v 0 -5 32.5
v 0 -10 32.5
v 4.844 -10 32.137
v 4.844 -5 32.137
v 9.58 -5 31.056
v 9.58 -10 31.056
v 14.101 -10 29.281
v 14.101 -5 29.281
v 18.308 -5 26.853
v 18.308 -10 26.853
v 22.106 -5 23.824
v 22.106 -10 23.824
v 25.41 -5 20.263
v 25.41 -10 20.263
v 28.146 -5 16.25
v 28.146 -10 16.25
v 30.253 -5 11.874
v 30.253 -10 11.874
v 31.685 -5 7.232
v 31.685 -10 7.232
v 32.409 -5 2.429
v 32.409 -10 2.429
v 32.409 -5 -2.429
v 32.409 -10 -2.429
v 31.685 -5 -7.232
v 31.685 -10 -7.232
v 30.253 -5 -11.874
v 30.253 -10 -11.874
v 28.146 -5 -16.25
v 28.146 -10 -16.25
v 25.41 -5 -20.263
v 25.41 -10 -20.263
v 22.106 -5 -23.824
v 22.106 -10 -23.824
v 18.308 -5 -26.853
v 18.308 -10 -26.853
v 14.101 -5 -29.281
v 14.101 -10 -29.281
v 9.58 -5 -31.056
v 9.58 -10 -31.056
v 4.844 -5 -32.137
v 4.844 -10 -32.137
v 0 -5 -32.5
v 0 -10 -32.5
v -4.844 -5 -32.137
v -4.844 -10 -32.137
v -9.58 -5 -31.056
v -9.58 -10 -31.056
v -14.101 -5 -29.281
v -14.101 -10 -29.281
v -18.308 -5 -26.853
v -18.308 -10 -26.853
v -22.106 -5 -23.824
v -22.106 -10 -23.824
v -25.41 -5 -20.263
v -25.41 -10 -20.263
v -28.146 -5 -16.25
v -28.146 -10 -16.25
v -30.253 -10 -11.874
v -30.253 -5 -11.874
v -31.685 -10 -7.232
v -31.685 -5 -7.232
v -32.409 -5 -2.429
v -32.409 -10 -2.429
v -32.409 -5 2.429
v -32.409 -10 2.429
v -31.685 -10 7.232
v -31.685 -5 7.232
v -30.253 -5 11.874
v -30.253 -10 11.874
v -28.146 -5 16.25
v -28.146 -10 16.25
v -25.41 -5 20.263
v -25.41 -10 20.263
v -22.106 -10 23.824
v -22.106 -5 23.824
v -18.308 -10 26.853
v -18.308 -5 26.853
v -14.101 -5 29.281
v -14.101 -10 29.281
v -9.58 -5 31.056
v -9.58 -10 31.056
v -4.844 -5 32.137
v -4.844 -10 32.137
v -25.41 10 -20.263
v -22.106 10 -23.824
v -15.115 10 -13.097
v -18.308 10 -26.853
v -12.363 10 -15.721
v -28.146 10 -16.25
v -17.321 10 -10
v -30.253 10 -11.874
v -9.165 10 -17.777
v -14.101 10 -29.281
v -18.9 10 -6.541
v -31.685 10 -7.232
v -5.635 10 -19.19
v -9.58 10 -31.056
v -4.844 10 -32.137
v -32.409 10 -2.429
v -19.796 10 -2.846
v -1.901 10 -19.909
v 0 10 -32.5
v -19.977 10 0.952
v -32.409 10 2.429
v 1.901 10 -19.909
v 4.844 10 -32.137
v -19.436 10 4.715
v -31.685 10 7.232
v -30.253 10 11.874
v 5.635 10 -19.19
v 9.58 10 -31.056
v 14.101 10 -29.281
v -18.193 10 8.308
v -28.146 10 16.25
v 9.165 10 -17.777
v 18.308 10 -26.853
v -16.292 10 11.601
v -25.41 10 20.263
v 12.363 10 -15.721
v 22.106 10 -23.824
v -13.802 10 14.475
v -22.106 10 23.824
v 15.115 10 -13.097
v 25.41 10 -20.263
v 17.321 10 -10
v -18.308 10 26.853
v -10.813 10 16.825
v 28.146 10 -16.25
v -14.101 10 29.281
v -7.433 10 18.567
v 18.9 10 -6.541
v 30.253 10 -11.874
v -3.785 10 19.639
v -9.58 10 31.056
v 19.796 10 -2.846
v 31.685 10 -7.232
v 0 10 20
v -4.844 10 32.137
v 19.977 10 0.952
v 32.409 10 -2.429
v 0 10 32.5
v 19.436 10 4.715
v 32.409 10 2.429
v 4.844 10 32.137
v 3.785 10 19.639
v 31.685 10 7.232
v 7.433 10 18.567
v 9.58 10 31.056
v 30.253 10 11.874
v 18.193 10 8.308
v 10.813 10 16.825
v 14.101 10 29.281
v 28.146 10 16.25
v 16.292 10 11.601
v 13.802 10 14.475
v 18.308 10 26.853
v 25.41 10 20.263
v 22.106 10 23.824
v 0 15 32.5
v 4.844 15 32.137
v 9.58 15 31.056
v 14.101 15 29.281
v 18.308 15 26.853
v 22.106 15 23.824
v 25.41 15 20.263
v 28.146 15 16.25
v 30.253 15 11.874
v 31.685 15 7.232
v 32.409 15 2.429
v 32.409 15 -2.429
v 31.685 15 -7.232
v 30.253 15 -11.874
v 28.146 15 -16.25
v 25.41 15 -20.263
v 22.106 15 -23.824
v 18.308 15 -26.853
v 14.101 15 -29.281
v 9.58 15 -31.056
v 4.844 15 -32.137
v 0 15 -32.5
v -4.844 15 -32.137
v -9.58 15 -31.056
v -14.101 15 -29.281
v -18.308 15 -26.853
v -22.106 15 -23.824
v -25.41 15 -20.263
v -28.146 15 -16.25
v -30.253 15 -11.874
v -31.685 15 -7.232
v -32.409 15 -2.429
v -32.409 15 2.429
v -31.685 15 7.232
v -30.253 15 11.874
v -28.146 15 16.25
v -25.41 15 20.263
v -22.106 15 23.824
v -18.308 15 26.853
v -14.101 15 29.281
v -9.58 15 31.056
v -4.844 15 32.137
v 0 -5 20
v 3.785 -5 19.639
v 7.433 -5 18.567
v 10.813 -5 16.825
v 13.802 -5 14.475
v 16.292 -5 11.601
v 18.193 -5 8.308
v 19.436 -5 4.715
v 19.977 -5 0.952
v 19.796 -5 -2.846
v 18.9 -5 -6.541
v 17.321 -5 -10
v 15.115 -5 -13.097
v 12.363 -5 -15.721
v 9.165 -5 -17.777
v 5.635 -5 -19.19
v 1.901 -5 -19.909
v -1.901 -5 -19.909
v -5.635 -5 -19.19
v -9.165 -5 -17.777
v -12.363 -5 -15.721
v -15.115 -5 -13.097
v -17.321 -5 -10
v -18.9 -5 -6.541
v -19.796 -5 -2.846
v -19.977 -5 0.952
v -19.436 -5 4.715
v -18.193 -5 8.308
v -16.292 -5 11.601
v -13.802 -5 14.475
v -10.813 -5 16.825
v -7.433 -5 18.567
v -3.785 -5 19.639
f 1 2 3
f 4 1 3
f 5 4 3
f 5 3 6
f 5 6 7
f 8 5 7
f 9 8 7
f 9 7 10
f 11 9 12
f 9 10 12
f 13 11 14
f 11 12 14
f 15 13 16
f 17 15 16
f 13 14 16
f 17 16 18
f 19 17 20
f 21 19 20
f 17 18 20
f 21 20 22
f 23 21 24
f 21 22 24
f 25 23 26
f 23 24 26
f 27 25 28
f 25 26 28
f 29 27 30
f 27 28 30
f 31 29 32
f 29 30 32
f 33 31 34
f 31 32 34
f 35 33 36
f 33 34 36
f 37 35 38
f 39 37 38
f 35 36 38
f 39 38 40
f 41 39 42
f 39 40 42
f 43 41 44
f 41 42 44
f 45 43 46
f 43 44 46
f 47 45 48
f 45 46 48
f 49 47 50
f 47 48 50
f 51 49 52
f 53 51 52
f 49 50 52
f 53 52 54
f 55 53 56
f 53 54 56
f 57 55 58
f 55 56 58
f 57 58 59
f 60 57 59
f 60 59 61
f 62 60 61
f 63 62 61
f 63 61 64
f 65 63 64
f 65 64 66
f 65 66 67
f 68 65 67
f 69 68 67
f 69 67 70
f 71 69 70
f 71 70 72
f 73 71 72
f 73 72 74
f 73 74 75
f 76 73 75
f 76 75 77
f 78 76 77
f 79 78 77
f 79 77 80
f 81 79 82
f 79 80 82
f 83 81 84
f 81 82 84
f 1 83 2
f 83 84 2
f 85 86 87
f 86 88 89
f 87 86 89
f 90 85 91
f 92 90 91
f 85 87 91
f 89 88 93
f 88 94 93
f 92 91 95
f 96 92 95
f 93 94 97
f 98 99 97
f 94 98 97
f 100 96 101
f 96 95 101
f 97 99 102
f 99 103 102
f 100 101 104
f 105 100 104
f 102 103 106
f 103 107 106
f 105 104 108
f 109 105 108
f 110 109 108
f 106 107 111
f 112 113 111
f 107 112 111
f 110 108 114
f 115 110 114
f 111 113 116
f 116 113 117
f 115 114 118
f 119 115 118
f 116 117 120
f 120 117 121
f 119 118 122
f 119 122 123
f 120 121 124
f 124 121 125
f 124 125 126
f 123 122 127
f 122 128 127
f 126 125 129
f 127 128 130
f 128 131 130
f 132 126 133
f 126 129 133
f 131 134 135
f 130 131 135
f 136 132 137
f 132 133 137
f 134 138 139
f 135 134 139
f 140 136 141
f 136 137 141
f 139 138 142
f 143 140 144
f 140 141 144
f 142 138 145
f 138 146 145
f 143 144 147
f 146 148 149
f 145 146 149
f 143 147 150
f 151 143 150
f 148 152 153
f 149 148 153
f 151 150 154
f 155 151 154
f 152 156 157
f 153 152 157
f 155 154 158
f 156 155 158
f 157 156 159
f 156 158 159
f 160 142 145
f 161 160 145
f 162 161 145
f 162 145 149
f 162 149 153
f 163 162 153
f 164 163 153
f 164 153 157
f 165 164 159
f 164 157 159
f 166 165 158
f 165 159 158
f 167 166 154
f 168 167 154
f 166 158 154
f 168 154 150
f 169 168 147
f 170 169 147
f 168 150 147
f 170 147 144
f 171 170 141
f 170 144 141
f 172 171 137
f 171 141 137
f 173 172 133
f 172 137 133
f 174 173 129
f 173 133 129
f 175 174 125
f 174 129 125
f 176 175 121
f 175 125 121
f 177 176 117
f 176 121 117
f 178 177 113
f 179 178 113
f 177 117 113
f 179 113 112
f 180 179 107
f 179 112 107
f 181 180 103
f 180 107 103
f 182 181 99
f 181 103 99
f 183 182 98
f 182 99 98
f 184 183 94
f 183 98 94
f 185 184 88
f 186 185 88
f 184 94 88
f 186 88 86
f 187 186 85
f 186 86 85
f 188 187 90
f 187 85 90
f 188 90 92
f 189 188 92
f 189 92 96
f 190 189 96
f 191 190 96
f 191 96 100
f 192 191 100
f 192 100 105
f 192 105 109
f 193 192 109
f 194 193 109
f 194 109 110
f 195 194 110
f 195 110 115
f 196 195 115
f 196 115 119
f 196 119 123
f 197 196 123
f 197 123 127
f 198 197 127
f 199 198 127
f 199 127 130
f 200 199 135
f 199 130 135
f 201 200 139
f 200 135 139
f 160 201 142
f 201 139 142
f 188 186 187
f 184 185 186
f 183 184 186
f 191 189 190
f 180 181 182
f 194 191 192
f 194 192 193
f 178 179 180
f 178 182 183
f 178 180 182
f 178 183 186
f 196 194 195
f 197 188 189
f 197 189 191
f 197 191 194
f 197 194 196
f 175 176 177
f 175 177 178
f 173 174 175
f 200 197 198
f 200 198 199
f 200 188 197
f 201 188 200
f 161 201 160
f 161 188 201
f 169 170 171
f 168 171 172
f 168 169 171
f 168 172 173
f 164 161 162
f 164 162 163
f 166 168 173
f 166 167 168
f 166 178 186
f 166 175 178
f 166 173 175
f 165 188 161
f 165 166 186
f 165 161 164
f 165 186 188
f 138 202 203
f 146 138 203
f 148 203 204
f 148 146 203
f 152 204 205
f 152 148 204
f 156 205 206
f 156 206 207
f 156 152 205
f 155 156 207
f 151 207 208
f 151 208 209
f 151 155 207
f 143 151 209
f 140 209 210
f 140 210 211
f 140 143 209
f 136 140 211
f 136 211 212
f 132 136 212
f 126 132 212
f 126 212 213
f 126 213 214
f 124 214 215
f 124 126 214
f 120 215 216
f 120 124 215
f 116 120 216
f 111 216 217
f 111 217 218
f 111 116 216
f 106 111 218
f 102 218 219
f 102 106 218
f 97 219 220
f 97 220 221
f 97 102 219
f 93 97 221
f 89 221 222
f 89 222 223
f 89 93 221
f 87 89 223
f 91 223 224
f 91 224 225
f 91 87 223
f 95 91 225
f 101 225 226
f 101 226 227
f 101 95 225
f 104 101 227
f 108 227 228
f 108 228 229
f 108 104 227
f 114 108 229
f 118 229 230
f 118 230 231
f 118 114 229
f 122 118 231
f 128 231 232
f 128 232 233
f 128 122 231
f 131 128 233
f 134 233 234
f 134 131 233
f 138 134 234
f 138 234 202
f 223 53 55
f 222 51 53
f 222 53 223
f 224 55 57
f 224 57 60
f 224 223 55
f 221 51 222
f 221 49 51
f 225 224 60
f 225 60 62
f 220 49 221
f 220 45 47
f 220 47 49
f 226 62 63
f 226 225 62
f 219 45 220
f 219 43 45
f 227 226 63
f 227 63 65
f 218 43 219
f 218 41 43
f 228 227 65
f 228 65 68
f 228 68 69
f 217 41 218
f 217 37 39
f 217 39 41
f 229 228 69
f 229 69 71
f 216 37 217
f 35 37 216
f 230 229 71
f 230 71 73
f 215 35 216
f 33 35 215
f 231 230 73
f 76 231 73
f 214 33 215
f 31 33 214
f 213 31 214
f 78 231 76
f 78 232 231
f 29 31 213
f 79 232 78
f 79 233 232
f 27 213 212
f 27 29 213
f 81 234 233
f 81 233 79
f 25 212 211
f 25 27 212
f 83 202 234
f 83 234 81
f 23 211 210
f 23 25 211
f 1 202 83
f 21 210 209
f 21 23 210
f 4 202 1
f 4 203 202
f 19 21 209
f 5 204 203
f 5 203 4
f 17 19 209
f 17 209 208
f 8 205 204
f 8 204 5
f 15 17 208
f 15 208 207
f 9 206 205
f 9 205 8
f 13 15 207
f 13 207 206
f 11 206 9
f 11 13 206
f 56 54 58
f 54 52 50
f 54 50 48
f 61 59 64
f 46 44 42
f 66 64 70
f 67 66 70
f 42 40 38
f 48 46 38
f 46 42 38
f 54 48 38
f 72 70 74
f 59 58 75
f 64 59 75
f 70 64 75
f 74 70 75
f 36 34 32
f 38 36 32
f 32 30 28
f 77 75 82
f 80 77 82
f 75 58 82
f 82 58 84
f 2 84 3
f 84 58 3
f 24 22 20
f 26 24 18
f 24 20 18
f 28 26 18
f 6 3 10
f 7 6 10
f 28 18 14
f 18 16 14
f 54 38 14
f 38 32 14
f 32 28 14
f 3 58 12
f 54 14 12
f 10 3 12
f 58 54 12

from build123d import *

# Parameters (mm, degrees)
SKETCH1_R           = 20
BOSS_EXTRUDE1_DEPTH = 10
SKETCH2_R           = 32.5
BOSS_EXTRUDE2_DEPTH = 5
BOSS_EXTRUDE3_START = -20
SKETCH2_2_R         = 32.5
BOSS_EXTRUDE3_DEPTH = 5


with BuildPart() as part:
    # Sketch1 → Boss-Extrude1 (new, symmetric)
    with BuildSketch(Plane(origin=(0, 0, 0), x_dir=(1, 0, 0), z_dir=(0, 1, 0))):
        with Locations(Location((0, 0, 0), (0, 0, 270))):
            Circle(SKETCH1_R)
    extrude(amount=BOSS_EXTRUDE1_DEPTH, both=True)

    # Sketch2 → Boss-Extrude2 (add)
    with BuildSketch(Plane(origin=(0, 10, 0), x_dir=(1, 0, 0), z_dir=(0, 1, 0))):
        with Locations(Location((0, 0, 0), (0, 0, 270))):
            Circle(SKETCH2_R)
    extrude(amount=BOSS_EXTRUDE2_DEPTH)

    # Sketch2<2> → Boss-Extrude3 (add)
    with BuildSketch(Plane(origin=(0, 10, 0), x_dir=(1, 0, 0), z_dir=(0, 1, 0)).offset(BOSS_EXTRUDE3_START)):
        with Locations(Location((0, 0, 0), (0, 0, 270))):
            Circle(SKETCH2_2_R)
    extrude(amount=BOSS_EXTRUDE3_DEPTH)


solid = part.part
